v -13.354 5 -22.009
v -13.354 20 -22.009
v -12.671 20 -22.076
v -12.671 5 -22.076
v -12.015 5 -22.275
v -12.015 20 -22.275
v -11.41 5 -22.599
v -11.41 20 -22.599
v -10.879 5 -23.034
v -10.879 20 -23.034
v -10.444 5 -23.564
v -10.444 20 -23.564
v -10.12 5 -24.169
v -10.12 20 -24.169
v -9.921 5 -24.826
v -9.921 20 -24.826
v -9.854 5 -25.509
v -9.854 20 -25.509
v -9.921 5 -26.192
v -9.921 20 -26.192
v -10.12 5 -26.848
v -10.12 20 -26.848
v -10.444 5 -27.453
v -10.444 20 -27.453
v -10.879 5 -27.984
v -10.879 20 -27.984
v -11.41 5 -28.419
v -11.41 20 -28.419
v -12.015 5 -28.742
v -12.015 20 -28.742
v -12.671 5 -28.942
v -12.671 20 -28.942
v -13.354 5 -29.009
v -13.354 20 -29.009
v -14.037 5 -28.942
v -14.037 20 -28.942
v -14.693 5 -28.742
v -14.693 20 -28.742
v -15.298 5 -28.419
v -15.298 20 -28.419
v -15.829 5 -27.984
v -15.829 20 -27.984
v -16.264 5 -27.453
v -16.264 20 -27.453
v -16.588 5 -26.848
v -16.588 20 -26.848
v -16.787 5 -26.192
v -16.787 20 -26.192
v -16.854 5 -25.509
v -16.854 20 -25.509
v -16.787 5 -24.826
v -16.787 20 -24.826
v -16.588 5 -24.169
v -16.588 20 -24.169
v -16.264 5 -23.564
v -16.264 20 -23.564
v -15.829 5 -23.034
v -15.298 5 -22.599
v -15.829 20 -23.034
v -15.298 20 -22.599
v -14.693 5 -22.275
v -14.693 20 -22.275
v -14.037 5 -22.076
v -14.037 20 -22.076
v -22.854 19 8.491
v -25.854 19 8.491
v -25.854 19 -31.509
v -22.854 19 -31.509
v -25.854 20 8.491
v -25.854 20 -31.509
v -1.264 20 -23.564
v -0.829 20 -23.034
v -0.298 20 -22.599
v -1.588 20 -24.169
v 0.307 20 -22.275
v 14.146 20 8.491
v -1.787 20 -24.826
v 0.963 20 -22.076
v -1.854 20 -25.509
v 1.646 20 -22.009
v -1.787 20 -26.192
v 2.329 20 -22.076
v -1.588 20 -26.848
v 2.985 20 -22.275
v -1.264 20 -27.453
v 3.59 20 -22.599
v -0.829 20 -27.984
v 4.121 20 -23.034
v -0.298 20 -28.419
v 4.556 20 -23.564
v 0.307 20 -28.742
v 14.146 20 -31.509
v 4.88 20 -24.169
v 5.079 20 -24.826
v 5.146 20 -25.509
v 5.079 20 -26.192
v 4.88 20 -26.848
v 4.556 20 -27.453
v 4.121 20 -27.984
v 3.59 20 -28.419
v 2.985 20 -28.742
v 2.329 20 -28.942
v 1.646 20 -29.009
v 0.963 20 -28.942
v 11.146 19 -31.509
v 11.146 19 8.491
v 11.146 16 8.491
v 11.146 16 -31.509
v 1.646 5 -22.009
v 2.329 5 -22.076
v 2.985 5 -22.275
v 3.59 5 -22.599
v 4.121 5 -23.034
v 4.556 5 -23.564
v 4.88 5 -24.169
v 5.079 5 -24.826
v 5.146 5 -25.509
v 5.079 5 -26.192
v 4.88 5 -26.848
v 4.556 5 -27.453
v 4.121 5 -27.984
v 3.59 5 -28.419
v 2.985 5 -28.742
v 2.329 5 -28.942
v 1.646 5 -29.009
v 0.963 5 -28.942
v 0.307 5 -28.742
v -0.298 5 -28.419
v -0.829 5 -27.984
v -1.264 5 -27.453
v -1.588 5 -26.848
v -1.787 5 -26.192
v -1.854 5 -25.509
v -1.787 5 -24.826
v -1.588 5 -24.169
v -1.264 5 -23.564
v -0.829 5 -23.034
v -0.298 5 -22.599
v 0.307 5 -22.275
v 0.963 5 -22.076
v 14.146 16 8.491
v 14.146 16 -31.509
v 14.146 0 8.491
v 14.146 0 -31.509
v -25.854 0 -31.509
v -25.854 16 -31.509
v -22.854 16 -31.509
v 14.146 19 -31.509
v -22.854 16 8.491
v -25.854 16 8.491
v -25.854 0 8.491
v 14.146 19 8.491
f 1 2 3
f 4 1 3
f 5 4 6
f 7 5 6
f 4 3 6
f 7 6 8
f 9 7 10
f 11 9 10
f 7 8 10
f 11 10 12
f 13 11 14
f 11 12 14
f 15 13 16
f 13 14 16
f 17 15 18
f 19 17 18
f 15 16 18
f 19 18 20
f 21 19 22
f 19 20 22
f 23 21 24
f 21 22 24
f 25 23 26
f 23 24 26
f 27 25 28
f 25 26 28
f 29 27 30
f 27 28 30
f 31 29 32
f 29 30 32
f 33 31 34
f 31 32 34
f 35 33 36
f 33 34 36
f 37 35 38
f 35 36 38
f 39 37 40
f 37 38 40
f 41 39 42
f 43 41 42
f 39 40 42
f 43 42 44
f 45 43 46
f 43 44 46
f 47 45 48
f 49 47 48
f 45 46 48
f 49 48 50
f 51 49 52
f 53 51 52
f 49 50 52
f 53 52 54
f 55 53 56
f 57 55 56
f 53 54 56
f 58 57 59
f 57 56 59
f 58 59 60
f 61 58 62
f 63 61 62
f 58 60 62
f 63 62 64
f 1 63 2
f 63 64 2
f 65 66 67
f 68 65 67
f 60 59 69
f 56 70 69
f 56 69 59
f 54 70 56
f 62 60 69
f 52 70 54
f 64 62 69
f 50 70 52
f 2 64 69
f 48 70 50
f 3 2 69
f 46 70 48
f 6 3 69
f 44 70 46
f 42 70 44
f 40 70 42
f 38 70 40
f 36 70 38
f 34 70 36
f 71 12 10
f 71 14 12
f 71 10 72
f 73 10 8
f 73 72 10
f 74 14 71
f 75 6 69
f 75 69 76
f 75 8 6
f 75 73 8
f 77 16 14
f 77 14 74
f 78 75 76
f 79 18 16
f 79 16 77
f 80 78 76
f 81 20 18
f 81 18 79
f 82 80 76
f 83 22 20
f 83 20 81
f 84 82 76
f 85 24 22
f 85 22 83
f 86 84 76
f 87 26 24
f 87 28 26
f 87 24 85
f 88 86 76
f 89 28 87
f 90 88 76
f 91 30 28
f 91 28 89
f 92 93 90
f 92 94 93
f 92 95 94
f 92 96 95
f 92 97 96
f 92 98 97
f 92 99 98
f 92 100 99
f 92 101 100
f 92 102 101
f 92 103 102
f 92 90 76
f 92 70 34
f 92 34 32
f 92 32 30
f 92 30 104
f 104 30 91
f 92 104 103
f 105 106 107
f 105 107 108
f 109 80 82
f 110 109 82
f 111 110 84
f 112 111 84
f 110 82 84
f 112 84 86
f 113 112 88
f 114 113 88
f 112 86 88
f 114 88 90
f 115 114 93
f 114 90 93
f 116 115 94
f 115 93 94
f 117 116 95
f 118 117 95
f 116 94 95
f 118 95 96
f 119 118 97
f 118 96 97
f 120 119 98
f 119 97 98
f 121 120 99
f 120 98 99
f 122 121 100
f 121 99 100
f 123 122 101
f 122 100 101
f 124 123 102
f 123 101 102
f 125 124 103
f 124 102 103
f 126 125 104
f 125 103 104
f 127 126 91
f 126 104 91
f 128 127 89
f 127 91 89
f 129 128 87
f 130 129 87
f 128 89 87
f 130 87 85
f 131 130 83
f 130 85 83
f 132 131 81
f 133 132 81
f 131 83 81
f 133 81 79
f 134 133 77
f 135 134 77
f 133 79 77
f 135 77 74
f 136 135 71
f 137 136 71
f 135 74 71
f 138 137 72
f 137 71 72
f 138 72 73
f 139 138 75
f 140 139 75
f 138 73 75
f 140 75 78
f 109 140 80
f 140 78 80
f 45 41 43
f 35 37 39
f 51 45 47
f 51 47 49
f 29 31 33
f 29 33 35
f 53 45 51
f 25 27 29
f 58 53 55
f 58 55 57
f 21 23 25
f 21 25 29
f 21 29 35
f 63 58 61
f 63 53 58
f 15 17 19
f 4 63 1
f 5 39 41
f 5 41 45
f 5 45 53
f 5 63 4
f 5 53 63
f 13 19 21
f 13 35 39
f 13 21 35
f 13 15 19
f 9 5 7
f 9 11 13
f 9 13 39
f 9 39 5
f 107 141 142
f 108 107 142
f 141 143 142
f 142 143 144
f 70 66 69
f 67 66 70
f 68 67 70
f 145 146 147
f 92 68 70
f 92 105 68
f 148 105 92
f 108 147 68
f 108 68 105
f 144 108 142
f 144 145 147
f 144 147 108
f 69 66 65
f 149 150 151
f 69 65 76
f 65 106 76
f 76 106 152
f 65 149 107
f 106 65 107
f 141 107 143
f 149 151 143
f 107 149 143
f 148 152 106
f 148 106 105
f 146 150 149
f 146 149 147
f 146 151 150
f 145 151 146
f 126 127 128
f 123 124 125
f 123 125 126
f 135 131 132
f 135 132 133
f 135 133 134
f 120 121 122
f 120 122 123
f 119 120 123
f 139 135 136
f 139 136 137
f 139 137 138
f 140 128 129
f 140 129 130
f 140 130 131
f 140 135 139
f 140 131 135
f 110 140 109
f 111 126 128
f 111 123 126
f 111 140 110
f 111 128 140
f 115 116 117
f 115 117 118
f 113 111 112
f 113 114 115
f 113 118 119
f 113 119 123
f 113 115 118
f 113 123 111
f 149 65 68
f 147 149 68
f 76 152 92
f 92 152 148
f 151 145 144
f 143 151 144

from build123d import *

# Parameters (mm, degrees)
SKETCH1_W           = 40
SKETCH1_H           = 40
BOSS_EXTRUDE1_DEPTH = 20
SKETCH2_R           = 3.5
CUT_EXTRUDE1_DEPTH  = 15
SKETCH3_W           = 40
SKETCH3_H           = 3
CUT_EXTRUDE2_DEPTH  = 3


with BuildPart() as part:
    # Sketch1 → Boss-Extrude1 (new body)
    with BuildSketch(Plane(origin=(0, 0, 0), x_dir=(1, 0, 0), z_dir=(0, 1, 0))):
        with Locations((-5.853997969, 11.508758813)):
            Rectangle(SKETCH1_W, SKETCH1_H)
    extrude(amount=BOSS_EXTRUDE1_DEPTH)

    # Sketch2 → Cut-Extrude1 (cut)
    with BuildSketch(Plane(origin=(0, 20, 0), x_dir=(1, 0, 0), z_dir=(0, 1, 0))):
        with Locations(Location((-13.353997969, 25.508758813, 0), (0, 0, 270))):
            Circle(SKETCH2_R)
        with Locations(Location((1.646002031, 25.508758813, 0), (0, 0, 270))):
            Circle(SKETCH2_R)
    extrude(amount=-CUT_EXTRUDE1_DEPTH, mode=Mode.SUBTRACT)

    # Sketch3 → Cut-Extrude2 (cut)
    with BuildSketch(Plane(origin=(14.146002031, 0, 0), x_dir=(0, 0, -1), z_dir=(1, 0, 0))):
        with Locations((11.508758813, 17.5)):
            Rectangle(SKETCH3_W, SKETCH3_H)
    cut_extrude2 = extrude(amount=-CUT_EXTRUDE2_DEPTH, mode=Mode.SUBTRACT)

    # Mirror1: Cut-Extrude2 across plane
    add(cut_extrude2.mirror(Plane(origin=(-5.853997969, 0, 0), x_dir=(0, 0, 1), z_dir=(1, 0, 0))), mode=Mode.SUBTRACT)


solid = part.part
